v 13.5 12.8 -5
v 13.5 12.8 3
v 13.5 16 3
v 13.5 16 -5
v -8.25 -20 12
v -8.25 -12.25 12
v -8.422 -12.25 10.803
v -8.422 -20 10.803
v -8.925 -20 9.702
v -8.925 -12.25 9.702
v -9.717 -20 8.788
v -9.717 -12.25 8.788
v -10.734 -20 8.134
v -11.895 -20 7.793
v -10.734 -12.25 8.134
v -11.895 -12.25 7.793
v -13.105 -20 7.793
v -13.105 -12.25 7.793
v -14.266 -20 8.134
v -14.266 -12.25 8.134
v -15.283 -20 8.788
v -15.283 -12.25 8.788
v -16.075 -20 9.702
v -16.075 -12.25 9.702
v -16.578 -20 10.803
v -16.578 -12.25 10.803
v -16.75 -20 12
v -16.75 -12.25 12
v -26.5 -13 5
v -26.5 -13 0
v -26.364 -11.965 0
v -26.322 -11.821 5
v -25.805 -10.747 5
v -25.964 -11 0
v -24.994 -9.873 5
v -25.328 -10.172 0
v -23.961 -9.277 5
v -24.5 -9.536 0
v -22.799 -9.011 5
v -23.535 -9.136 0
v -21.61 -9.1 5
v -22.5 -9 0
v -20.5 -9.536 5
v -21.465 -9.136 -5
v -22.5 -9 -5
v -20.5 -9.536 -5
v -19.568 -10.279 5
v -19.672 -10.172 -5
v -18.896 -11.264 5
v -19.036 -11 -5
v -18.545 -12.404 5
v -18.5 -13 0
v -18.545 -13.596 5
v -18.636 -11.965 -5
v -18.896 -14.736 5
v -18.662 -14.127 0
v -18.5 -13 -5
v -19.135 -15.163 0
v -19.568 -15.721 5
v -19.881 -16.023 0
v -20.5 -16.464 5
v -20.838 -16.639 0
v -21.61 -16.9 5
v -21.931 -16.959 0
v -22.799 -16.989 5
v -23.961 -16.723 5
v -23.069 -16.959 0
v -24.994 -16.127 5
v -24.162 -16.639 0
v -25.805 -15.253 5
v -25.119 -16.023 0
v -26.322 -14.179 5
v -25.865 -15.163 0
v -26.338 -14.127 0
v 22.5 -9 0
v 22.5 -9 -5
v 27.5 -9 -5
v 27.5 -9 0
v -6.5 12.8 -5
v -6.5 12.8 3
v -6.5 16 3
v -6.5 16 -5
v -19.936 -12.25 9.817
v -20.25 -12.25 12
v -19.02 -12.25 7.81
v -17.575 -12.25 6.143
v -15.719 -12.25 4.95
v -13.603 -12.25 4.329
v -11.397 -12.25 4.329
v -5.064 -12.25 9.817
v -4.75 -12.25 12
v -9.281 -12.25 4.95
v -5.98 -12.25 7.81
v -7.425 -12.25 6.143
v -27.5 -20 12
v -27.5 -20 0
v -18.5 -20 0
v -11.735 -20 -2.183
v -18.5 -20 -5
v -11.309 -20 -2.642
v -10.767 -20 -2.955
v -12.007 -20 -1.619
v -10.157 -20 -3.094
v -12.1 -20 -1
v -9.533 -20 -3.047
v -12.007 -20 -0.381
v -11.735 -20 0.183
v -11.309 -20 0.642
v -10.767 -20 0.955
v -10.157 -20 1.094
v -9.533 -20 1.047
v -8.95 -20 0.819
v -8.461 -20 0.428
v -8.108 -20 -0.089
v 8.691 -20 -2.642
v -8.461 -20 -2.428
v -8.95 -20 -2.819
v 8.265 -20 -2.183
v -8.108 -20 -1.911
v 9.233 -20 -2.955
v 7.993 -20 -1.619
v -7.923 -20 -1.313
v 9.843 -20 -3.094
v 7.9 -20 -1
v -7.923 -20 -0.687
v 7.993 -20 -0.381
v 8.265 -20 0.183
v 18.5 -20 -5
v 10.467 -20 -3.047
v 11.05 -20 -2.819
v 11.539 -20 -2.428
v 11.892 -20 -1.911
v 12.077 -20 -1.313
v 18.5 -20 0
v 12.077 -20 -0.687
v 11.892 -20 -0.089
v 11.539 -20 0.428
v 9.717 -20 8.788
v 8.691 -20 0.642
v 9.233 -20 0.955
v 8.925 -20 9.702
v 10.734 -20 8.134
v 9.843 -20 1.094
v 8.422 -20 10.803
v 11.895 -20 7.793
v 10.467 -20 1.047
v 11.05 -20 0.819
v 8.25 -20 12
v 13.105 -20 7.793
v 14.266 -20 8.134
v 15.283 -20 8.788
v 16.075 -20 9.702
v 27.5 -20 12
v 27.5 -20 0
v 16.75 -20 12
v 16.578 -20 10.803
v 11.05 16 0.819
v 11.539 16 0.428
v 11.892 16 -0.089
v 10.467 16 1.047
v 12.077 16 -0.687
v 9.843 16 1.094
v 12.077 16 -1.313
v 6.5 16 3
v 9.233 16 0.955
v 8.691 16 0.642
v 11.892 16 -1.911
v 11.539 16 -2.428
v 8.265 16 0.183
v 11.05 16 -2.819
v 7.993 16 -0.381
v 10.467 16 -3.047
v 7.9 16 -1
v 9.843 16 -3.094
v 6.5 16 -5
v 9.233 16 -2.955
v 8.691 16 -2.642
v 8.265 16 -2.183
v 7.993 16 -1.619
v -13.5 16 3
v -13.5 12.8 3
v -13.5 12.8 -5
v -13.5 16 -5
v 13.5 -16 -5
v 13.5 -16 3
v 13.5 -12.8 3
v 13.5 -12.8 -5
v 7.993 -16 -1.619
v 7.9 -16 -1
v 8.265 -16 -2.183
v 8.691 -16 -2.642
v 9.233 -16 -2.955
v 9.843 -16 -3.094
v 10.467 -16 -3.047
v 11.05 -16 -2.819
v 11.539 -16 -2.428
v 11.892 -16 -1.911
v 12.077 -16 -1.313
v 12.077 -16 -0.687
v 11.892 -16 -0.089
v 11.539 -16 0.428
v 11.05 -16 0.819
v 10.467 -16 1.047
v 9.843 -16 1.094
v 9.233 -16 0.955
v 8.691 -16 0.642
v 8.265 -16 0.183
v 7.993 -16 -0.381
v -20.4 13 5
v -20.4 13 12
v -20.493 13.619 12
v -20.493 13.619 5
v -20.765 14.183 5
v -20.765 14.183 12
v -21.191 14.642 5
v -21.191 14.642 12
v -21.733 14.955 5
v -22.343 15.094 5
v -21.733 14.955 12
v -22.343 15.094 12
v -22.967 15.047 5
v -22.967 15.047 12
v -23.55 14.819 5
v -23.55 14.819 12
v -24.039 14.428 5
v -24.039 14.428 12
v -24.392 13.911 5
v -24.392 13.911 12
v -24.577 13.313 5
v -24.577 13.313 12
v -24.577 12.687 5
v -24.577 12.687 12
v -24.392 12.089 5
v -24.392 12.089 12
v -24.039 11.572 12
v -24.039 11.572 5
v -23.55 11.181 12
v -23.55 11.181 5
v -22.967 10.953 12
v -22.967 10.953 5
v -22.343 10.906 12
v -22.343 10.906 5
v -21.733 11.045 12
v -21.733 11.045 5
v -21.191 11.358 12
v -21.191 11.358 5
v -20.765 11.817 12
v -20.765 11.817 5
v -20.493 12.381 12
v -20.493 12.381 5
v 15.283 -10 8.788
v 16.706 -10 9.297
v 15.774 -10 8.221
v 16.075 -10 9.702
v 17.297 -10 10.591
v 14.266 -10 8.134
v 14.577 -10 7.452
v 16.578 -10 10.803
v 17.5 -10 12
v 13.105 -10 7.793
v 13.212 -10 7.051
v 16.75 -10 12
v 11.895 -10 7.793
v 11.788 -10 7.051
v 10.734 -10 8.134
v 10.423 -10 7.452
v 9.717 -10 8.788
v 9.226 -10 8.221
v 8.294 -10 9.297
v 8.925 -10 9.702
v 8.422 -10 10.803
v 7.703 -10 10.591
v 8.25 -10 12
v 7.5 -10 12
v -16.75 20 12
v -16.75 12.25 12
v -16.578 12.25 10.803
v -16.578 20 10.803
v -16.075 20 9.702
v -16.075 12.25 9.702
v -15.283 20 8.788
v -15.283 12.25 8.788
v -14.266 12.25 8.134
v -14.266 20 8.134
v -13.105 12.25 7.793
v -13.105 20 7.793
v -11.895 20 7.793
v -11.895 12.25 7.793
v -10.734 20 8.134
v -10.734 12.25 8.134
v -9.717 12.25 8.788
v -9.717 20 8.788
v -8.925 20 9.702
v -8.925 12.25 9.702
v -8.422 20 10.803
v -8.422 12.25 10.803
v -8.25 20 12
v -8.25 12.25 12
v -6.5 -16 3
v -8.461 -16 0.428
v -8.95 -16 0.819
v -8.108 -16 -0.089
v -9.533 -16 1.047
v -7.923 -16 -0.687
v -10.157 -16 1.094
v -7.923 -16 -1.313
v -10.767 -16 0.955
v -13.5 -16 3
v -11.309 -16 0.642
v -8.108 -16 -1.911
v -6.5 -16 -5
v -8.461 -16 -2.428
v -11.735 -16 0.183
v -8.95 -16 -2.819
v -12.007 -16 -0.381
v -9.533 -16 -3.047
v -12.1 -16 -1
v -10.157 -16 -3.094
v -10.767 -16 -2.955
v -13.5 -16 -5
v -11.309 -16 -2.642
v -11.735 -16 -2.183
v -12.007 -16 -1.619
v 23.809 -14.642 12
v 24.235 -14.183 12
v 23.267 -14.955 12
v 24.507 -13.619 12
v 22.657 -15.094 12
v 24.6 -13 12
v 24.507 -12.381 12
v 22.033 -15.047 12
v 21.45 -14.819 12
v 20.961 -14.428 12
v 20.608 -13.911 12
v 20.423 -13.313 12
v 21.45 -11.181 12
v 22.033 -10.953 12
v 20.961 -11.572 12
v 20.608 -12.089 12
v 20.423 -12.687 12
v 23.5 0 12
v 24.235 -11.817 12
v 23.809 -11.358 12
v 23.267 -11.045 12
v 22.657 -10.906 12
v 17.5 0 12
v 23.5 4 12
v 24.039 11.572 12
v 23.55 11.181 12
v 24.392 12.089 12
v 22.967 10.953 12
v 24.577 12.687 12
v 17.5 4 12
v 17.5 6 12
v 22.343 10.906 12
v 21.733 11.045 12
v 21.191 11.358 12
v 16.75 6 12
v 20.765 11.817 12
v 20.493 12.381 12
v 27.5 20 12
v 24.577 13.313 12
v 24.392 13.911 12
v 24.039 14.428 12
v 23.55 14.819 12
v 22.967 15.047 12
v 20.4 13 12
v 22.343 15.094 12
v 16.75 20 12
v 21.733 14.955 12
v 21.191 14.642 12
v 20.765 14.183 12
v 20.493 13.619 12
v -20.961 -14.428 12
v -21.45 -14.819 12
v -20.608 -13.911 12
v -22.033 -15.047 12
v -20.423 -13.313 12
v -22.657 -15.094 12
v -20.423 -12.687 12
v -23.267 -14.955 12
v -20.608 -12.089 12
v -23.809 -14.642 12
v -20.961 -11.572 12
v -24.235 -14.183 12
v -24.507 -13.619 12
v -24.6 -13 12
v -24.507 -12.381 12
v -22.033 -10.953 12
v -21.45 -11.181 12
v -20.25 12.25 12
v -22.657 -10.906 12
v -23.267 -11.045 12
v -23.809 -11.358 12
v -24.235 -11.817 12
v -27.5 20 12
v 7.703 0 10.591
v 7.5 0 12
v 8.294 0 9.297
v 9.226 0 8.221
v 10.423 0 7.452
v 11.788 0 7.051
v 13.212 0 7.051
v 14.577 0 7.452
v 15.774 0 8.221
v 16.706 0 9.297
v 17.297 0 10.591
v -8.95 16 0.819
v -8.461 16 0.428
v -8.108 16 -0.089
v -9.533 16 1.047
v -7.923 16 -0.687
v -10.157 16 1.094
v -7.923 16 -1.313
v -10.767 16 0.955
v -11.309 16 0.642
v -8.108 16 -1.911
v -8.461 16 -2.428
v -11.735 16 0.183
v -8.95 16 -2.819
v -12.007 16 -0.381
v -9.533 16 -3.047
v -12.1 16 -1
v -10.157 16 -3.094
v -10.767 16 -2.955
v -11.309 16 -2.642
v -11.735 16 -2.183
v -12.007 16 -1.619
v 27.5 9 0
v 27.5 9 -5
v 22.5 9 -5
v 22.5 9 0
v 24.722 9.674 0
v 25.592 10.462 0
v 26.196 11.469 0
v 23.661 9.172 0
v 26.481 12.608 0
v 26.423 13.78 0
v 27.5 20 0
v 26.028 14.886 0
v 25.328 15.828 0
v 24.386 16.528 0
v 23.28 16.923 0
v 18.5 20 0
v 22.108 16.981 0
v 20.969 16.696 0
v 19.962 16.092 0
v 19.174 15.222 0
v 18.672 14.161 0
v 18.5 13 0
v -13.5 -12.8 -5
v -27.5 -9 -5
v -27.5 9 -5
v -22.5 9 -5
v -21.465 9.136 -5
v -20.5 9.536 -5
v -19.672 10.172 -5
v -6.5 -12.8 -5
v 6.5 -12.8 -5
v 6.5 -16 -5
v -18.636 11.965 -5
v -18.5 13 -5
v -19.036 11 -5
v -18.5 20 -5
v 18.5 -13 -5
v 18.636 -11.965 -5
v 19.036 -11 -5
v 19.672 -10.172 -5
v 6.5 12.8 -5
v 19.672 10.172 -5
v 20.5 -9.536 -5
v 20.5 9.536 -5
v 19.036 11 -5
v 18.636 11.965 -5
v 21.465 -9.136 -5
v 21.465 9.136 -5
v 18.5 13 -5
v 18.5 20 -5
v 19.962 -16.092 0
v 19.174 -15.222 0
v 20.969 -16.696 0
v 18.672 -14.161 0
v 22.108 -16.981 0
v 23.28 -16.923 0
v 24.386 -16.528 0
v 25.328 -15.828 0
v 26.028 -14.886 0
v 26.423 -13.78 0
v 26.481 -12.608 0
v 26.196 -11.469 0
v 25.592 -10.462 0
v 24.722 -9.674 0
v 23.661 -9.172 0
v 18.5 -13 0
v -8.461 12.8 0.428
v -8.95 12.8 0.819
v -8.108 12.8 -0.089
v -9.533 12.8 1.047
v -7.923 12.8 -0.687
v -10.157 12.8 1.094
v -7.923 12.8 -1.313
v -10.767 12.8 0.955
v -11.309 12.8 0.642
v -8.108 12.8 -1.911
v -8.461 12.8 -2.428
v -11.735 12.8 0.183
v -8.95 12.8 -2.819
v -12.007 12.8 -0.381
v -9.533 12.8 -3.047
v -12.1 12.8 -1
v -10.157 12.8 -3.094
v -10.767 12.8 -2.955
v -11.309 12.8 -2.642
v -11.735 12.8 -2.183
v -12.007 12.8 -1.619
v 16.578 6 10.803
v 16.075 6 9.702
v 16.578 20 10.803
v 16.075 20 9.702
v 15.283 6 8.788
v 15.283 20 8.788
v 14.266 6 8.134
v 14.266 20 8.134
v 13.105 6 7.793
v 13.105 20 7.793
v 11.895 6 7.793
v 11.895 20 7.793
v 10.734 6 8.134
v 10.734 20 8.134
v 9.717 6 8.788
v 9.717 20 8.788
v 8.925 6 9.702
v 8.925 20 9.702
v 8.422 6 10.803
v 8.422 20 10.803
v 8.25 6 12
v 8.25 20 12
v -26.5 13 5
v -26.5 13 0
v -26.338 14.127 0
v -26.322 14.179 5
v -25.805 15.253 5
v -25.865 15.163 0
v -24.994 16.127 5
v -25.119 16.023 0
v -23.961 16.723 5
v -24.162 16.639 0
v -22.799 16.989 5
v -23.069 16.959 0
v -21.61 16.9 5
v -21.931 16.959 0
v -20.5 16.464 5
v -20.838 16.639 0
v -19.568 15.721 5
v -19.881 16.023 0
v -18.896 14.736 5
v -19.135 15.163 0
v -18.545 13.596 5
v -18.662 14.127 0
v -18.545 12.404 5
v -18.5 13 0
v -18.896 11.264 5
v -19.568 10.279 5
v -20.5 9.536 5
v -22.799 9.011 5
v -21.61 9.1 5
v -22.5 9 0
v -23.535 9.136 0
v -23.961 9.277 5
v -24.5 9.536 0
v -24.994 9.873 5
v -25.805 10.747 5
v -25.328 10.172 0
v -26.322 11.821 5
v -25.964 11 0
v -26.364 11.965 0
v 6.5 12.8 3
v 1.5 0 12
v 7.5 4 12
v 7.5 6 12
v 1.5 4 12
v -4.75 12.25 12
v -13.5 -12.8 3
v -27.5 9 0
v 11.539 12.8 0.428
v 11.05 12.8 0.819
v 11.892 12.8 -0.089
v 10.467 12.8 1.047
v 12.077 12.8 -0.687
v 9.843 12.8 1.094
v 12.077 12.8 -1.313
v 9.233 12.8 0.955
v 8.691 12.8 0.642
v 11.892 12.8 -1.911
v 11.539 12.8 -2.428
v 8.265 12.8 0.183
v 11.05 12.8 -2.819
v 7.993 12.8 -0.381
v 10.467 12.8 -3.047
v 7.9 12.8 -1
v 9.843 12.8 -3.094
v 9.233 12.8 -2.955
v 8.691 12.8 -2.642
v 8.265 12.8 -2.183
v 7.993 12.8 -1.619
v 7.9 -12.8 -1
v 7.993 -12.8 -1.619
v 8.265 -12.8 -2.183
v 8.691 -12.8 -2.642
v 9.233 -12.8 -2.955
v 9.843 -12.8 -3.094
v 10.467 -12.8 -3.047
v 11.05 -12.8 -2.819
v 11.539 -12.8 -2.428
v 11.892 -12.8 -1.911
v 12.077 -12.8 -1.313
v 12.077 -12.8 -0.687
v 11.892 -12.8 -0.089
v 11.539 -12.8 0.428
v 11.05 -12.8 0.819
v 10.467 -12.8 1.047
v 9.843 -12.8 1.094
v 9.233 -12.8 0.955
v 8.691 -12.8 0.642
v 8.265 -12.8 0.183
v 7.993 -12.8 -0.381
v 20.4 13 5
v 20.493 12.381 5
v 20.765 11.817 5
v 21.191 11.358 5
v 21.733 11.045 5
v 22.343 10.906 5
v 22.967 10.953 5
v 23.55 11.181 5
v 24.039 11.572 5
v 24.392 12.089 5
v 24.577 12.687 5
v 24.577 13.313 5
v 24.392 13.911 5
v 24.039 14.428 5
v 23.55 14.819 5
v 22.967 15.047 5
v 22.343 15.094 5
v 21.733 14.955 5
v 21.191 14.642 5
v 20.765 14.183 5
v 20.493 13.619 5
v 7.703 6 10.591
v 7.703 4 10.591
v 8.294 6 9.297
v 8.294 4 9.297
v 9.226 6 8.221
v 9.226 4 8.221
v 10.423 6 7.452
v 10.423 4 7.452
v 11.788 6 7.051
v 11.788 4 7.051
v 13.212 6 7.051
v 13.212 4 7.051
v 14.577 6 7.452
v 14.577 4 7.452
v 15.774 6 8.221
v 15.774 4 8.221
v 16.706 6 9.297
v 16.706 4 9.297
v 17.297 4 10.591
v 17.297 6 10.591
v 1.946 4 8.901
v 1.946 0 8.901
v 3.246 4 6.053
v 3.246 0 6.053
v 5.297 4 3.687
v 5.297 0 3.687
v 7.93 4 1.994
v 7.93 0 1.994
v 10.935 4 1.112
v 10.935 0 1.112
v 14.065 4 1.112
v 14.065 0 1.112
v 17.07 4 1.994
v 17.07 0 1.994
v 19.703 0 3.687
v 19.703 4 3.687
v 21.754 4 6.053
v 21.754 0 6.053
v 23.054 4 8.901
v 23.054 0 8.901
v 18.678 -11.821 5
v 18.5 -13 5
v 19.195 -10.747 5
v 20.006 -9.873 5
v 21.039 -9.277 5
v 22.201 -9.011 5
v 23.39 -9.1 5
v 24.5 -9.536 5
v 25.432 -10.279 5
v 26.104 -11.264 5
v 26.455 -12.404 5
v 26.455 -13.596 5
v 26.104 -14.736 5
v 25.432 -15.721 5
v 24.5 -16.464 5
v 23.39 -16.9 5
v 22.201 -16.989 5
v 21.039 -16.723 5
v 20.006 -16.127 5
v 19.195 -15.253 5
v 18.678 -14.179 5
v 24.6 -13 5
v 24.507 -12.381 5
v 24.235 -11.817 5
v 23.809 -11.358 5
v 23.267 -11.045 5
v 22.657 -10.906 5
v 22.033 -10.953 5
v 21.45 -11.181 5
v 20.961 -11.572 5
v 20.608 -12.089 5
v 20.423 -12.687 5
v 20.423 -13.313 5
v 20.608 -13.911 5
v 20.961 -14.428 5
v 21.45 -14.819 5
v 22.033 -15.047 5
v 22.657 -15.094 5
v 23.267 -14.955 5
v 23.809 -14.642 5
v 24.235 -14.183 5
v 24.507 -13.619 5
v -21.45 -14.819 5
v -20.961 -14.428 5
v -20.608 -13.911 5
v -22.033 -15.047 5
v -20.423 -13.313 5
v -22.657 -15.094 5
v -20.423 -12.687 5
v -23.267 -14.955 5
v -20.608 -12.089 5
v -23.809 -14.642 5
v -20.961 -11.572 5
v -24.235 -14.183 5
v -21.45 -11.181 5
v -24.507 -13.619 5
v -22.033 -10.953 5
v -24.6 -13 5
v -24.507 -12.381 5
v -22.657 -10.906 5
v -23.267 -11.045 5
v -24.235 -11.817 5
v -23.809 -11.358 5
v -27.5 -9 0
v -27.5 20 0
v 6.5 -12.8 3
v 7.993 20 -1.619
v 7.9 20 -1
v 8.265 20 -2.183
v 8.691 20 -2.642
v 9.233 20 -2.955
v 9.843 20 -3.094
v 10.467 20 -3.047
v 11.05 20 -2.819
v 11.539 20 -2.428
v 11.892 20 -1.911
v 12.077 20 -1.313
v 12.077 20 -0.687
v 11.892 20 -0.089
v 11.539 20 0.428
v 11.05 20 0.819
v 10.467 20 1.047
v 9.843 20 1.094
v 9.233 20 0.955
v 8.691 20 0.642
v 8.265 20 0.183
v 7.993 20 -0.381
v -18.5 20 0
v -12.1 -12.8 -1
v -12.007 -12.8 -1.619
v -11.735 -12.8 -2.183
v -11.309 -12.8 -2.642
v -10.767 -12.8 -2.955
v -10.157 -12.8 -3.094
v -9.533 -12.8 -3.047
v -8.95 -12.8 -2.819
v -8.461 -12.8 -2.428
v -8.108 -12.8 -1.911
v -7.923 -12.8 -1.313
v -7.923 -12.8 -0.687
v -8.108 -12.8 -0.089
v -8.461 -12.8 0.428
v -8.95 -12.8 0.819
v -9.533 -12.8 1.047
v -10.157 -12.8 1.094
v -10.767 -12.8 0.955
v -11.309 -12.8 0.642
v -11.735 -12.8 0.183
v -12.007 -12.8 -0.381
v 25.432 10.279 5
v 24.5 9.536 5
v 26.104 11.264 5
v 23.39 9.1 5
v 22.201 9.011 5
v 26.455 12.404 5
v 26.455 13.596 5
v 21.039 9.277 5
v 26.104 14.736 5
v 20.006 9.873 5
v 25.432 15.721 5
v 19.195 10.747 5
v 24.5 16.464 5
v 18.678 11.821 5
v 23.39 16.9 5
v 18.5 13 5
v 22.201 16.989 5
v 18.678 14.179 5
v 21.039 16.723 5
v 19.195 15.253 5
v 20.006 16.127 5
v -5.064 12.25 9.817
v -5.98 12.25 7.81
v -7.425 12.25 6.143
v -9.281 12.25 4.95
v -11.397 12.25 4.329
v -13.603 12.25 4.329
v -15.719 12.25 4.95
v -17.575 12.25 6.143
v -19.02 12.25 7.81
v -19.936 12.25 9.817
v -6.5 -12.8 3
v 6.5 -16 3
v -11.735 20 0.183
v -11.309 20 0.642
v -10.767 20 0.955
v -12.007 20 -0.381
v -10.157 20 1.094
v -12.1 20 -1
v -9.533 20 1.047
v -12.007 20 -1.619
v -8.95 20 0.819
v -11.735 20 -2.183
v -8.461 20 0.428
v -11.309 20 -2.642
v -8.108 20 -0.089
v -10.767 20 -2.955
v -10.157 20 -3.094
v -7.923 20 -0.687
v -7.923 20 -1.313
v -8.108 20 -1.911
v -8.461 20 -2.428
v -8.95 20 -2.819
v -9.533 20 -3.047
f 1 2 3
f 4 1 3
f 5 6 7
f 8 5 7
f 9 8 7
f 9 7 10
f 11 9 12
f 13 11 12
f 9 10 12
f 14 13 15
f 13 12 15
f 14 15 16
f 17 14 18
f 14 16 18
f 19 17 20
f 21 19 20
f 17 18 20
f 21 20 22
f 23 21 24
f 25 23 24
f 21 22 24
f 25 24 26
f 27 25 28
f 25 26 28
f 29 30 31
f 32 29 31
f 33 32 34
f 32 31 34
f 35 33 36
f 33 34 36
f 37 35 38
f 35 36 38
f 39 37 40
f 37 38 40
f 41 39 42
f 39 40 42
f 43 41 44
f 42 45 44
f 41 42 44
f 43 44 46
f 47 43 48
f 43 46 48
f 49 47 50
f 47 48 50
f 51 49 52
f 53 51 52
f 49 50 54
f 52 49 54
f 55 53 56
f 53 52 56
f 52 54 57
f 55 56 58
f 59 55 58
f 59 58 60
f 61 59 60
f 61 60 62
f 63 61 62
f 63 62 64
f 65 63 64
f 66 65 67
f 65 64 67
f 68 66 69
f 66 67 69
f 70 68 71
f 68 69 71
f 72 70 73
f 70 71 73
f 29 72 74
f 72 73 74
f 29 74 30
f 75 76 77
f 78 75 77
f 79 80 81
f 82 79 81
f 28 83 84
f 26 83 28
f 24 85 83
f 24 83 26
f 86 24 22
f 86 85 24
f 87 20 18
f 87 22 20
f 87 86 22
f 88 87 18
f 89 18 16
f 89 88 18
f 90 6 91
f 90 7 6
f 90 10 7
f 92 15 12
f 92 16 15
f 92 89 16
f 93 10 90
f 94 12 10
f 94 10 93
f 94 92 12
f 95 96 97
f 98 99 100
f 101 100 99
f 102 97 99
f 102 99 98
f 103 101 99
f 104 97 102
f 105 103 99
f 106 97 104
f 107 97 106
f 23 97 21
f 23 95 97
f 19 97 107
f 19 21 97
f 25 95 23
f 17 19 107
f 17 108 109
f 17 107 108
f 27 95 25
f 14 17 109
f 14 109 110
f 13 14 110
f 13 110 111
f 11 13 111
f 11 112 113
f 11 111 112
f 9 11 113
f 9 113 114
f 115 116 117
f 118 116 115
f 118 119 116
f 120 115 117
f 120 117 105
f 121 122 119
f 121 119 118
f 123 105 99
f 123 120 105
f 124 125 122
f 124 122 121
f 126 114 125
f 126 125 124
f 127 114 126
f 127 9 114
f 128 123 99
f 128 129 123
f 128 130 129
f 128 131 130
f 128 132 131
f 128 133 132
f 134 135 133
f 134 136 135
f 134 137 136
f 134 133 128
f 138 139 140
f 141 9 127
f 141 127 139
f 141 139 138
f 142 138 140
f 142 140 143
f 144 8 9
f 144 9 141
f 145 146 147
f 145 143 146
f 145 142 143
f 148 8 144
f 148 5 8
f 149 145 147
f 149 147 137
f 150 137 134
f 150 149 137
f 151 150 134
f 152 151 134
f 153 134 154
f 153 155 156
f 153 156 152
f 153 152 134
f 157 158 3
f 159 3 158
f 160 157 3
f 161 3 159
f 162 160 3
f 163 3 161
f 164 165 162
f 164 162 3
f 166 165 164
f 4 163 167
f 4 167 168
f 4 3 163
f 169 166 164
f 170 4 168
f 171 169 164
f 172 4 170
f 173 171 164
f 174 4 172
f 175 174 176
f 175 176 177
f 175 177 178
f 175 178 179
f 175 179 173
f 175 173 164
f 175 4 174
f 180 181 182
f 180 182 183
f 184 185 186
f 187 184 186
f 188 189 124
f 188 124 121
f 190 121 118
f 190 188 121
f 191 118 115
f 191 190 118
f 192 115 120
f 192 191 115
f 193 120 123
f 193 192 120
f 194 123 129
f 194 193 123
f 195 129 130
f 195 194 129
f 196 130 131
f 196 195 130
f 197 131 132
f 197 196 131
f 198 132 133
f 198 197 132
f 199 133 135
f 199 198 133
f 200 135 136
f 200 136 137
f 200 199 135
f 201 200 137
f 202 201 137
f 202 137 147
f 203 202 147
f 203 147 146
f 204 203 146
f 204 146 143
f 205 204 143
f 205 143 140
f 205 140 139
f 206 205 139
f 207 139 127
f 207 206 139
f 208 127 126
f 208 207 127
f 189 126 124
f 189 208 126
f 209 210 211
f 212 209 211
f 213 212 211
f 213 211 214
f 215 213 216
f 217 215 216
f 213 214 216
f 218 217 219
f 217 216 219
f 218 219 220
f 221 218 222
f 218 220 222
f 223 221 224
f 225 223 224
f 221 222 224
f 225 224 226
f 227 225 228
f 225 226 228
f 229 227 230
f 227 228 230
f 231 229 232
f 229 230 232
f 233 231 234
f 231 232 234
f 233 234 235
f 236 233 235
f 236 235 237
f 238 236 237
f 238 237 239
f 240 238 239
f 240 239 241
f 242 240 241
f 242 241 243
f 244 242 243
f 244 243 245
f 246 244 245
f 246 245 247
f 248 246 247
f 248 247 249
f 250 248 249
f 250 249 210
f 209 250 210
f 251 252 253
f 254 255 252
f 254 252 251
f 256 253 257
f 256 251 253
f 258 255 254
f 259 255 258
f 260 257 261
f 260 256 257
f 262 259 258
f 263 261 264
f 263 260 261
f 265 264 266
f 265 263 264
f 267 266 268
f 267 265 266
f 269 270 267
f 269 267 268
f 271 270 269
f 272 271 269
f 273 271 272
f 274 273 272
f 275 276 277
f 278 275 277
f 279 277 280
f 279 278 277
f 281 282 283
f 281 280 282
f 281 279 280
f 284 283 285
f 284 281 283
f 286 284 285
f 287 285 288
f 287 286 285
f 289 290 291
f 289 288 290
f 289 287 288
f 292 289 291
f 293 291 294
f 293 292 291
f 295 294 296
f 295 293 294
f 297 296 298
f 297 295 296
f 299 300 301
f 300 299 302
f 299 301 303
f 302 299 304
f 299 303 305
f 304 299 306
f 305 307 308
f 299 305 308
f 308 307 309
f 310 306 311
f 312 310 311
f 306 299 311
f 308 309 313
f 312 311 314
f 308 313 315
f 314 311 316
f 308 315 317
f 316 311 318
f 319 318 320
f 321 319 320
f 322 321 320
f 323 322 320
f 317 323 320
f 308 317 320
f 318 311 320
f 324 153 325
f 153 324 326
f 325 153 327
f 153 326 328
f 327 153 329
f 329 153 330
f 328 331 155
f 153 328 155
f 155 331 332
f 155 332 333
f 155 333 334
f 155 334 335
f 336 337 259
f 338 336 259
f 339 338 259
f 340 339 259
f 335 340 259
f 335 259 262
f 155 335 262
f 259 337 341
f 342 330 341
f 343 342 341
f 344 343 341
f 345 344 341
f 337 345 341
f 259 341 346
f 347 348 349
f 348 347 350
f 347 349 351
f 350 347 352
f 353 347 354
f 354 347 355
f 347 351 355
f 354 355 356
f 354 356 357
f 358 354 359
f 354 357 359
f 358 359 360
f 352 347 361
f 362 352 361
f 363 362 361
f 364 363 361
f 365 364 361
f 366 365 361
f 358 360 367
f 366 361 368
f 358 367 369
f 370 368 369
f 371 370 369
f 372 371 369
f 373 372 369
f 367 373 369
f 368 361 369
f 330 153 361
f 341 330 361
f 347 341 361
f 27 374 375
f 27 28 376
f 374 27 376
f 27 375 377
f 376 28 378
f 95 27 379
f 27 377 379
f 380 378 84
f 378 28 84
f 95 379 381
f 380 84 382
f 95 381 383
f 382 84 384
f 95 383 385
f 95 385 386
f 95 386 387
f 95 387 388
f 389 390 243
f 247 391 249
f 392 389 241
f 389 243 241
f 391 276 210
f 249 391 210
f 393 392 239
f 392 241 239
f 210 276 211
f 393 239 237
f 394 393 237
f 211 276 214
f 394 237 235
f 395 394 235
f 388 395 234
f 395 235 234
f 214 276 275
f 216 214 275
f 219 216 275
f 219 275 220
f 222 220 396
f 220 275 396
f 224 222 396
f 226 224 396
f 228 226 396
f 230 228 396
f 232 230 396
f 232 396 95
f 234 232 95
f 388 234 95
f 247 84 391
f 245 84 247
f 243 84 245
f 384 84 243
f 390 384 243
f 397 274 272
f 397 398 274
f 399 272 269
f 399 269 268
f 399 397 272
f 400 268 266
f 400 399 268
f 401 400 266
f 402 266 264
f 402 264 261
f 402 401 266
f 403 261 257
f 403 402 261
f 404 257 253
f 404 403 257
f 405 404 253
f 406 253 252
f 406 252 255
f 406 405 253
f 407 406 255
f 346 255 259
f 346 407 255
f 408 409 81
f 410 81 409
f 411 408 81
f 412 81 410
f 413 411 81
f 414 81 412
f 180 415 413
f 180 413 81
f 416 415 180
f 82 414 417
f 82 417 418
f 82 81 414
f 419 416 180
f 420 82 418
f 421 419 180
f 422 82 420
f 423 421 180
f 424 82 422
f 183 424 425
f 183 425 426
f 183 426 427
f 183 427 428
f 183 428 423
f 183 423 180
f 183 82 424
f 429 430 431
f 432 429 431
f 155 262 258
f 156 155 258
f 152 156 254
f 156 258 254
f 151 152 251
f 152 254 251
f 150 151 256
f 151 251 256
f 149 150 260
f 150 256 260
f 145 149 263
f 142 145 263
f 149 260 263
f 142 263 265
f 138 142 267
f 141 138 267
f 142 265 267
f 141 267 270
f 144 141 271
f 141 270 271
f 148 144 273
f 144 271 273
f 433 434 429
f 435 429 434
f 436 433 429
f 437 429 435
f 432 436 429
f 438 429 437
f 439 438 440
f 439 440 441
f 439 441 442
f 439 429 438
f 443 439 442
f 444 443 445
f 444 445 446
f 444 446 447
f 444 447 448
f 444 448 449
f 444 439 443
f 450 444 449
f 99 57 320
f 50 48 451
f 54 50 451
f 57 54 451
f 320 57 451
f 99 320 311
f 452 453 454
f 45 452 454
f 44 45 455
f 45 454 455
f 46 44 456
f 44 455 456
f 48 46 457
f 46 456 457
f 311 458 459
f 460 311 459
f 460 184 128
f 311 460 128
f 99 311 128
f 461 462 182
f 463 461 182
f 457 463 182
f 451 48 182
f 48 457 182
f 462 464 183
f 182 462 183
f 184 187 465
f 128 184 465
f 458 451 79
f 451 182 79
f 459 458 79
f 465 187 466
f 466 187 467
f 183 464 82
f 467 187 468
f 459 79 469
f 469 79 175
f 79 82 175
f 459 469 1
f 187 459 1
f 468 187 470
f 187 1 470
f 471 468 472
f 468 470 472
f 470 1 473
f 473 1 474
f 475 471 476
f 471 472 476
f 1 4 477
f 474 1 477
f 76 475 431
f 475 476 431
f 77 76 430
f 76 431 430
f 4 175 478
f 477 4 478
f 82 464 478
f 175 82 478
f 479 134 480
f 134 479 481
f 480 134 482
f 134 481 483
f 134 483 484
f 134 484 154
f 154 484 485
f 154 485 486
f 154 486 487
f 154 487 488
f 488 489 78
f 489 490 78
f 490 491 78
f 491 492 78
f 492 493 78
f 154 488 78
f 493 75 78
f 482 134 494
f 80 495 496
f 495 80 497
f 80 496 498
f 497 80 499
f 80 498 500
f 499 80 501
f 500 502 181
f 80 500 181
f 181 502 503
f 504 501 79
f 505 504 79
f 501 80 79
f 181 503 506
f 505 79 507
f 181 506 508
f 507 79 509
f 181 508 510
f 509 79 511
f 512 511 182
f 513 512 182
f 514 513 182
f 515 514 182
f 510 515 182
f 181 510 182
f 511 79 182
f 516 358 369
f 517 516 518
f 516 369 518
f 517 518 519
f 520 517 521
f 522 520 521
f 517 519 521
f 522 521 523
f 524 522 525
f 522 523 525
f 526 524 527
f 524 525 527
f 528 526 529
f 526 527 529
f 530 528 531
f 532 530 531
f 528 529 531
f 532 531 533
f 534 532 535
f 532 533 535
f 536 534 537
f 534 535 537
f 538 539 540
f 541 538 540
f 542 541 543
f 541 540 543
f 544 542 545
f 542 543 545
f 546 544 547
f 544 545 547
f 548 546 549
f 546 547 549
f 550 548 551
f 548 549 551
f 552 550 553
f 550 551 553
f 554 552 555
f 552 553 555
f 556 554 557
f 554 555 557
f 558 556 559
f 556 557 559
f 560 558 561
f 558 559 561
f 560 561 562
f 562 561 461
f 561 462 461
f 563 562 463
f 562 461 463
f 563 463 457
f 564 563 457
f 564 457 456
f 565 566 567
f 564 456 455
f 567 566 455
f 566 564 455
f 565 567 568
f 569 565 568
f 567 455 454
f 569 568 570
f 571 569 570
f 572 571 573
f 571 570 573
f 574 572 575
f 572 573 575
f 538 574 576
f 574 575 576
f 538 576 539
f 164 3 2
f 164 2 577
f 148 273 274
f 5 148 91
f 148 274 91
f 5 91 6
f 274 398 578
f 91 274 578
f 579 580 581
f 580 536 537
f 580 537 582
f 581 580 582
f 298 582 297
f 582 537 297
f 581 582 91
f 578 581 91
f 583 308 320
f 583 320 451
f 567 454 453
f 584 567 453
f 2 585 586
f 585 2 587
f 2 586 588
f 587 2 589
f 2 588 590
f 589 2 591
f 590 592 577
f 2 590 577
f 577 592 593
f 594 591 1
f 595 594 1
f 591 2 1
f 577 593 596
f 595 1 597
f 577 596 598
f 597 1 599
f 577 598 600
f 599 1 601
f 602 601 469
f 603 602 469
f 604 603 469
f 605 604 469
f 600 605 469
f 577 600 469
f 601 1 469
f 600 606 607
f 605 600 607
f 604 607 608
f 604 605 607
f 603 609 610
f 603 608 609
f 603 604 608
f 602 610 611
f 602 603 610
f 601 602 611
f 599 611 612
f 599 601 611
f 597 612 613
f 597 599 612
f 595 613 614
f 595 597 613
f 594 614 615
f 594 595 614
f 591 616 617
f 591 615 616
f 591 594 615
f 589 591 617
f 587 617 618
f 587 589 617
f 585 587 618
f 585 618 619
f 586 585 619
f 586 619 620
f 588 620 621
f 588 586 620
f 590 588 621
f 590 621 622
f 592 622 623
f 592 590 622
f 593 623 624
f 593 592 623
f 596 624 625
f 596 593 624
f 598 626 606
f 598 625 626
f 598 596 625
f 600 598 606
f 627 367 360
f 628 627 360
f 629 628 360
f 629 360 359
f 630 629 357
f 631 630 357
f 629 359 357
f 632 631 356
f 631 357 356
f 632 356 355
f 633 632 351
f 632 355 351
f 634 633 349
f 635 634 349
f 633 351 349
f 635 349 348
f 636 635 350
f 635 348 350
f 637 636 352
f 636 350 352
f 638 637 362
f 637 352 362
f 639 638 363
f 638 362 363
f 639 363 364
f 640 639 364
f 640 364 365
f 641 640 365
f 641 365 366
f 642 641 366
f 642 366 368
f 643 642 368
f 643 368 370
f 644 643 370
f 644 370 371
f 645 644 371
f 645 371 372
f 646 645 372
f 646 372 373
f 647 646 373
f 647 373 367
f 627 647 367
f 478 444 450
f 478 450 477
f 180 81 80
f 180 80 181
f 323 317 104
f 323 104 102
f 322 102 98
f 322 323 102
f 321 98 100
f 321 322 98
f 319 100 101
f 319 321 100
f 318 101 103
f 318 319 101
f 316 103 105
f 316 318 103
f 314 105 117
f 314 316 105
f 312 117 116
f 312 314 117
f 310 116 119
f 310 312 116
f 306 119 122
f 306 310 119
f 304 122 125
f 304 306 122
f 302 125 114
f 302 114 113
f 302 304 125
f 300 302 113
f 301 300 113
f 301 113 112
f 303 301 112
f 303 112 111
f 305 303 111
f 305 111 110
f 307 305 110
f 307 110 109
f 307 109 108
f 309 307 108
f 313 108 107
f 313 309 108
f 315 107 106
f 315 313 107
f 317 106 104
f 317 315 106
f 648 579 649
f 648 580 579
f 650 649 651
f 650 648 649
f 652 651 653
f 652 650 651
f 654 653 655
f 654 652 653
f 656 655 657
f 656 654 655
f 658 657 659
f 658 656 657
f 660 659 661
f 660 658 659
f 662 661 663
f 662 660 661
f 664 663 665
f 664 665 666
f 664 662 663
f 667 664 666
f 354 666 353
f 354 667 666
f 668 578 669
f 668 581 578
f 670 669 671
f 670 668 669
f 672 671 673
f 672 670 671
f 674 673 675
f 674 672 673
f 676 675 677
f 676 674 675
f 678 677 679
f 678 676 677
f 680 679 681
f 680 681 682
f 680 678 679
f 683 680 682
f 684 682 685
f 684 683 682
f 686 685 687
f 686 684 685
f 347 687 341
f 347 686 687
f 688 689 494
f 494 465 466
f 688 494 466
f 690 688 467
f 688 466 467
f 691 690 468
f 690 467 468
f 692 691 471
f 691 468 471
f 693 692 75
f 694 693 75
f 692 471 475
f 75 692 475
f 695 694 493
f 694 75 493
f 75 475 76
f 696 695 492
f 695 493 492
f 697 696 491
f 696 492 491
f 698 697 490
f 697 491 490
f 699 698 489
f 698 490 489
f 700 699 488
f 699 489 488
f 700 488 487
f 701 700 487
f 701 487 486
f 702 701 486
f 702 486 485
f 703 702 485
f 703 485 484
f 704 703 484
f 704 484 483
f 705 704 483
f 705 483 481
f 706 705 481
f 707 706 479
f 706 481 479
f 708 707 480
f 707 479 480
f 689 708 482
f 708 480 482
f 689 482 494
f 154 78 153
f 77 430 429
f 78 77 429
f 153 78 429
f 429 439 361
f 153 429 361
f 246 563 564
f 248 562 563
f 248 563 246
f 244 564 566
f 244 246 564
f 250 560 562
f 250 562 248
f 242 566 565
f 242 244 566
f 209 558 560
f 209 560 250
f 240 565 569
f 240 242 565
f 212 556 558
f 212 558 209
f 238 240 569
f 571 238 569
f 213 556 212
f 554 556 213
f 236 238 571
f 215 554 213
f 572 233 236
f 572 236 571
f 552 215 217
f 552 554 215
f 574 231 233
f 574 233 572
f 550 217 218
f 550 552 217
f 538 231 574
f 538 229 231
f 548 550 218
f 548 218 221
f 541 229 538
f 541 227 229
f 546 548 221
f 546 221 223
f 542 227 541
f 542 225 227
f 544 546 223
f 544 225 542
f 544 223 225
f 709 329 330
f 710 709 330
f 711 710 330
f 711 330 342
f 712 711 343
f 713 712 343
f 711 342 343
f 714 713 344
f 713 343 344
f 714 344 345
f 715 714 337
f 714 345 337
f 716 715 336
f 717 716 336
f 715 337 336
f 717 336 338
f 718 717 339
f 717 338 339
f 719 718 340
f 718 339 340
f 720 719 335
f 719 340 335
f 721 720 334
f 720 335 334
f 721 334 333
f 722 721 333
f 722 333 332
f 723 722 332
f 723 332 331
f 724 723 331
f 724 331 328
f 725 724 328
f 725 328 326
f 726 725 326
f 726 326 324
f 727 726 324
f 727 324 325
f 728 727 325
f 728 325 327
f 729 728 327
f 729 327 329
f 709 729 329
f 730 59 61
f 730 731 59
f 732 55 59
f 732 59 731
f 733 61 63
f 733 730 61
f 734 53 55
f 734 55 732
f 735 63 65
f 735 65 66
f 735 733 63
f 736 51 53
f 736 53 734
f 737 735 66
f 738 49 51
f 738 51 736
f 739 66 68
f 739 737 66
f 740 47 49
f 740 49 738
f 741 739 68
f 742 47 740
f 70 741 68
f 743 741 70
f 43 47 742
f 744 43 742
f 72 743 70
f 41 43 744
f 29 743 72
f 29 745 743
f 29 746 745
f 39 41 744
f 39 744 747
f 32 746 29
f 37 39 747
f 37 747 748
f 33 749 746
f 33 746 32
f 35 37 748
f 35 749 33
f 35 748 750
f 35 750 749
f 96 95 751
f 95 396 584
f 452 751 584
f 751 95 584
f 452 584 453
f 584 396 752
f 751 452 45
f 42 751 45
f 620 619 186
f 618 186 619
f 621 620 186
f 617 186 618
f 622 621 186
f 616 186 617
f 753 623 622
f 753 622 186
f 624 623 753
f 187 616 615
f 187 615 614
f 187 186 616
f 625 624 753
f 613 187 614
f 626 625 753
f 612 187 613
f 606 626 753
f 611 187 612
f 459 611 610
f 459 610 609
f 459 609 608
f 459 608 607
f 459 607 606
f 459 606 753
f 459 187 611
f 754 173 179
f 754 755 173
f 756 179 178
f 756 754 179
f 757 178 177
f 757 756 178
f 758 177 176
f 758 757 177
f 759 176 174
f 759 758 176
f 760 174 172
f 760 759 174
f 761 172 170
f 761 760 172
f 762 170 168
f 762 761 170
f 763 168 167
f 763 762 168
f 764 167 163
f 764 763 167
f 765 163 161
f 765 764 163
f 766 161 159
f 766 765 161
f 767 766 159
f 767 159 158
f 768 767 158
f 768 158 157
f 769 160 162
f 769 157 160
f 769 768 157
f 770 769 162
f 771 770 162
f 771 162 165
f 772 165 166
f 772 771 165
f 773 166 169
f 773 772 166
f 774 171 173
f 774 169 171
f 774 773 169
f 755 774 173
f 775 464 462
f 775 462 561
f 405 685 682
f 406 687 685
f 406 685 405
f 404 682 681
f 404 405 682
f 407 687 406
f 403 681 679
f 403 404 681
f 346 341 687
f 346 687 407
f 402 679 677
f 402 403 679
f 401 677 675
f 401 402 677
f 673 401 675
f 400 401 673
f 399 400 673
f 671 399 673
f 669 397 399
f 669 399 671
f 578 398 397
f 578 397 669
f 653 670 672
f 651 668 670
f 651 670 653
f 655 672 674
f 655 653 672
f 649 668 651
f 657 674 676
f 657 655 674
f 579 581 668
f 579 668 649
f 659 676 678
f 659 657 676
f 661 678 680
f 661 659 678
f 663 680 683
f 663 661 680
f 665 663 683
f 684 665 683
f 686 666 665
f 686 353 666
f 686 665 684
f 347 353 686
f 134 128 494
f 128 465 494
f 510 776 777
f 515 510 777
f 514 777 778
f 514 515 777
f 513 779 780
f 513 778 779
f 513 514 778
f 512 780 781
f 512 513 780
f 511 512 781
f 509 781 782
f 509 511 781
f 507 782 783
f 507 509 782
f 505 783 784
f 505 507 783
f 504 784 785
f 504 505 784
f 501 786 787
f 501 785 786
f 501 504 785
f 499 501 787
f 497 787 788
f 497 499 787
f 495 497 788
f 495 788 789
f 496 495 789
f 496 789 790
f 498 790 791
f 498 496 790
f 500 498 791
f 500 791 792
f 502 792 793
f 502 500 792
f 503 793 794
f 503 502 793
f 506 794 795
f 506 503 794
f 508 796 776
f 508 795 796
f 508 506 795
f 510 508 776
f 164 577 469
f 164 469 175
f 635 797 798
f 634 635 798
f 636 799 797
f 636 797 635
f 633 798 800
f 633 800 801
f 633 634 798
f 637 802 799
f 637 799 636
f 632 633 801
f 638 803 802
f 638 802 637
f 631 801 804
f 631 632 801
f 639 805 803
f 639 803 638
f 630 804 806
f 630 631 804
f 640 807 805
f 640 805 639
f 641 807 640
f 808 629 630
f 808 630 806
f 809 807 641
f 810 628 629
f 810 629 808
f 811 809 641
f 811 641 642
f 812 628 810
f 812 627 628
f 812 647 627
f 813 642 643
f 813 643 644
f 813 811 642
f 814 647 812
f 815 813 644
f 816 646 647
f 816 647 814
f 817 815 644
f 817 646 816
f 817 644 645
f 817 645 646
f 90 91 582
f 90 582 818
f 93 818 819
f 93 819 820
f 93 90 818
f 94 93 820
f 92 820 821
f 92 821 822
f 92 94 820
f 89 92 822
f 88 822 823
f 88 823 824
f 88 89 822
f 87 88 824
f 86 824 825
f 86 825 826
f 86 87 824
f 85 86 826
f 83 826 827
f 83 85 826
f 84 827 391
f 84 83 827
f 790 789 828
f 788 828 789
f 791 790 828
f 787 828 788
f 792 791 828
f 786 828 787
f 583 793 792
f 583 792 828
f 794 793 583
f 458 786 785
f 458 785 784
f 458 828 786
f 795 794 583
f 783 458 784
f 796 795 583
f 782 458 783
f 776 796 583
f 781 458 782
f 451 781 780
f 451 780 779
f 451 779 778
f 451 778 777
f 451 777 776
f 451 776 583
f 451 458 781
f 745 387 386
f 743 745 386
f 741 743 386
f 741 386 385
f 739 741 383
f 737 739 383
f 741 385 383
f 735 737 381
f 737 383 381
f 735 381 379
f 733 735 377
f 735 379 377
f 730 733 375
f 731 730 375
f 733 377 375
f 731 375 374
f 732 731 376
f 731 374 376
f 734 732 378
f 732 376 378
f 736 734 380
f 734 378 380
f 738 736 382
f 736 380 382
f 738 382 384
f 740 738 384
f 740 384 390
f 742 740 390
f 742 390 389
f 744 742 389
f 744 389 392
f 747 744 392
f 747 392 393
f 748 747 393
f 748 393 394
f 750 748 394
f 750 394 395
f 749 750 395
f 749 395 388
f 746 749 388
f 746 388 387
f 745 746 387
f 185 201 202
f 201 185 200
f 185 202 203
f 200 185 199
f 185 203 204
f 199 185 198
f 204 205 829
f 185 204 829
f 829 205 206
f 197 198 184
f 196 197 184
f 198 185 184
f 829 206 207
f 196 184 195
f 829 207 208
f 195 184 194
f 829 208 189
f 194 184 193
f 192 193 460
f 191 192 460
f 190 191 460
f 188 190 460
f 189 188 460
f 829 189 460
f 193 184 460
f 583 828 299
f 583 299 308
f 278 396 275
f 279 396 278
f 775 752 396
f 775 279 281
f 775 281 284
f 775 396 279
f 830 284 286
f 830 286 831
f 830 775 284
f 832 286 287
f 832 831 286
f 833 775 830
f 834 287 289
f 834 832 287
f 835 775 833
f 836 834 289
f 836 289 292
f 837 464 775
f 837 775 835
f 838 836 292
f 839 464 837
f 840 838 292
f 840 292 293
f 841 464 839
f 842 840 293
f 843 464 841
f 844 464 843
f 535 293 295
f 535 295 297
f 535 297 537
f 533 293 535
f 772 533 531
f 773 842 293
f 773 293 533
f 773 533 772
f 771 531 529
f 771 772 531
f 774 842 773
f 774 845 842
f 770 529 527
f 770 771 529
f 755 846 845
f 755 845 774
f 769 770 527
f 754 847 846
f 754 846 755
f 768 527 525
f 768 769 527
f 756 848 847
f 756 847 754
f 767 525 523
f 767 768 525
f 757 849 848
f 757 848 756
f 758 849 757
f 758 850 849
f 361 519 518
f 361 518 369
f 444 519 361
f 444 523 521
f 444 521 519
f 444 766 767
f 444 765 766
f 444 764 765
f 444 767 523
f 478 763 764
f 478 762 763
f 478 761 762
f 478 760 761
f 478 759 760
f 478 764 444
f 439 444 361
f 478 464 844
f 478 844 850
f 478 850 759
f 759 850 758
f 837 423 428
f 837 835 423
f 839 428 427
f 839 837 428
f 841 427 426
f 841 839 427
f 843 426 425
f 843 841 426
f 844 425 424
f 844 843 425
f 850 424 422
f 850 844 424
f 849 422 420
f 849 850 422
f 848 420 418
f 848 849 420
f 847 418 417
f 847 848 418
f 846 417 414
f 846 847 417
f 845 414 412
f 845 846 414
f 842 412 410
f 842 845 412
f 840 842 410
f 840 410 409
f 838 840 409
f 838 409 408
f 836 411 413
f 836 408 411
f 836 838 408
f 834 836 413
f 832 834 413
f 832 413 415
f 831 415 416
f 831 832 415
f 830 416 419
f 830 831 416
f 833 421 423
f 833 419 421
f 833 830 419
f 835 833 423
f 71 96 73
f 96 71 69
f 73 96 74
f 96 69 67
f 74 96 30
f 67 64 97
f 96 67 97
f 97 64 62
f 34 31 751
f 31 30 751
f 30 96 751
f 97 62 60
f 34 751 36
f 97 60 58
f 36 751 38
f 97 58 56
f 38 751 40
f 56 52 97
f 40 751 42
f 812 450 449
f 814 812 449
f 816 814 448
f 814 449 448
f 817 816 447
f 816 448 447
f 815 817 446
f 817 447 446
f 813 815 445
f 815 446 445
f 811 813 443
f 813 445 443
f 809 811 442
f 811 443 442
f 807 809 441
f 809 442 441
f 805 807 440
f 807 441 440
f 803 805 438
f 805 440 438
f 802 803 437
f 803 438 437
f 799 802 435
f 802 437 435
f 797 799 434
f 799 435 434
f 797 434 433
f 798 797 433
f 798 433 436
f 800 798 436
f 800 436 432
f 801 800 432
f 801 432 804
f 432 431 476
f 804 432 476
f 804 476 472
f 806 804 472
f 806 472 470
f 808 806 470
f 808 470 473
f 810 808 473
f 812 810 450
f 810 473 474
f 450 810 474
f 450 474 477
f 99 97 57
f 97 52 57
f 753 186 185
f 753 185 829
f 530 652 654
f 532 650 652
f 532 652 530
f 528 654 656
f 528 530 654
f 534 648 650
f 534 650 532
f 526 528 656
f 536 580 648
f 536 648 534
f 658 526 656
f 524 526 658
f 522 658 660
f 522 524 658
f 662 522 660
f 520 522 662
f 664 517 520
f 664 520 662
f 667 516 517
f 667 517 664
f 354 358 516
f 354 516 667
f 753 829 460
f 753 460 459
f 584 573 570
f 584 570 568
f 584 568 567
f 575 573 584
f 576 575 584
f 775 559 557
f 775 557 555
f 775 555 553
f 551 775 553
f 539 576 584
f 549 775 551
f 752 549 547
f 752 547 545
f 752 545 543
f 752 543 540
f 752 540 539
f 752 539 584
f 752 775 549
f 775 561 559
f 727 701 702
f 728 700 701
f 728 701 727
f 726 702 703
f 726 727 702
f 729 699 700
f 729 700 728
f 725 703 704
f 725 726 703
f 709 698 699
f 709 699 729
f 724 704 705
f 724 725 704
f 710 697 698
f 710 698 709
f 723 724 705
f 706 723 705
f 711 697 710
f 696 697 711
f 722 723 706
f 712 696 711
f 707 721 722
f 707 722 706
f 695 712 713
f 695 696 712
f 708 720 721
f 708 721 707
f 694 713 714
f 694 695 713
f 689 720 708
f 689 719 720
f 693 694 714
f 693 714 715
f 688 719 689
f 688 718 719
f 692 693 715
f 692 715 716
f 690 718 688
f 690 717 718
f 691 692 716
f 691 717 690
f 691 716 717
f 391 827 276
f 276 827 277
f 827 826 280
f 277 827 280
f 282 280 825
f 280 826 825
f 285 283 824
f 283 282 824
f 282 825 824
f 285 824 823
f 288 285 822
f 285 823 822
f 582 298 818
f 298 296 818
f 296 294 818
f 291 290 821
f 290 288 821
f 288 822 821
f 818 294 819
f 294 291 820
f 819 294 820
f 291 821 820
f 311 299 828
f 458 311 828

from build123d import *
from build123d.topology import SkipClean

# Parameters (mm, degrees)
ESQUISSE1_W                  = 55
ESQUISSE1_H                  = 45
BOSS_EXTRU_1_DEPTH           = 12
ESQUISSE2_R                  = 4.25
ENL_V_MAT_EXTRU_1_DEPTH      = 55.085580333
ENL_V_MAT_EXTRU_2_DEPTH      = 12.25
ENL_V_MAT_EXTRU_2_DEPTH_BACK = 12.25
ESQUISSE3_R                  = 7.75
ESQUISSE9_W                  = 61.062756781
ESQUISSE9_H                  = 12.22812859
ESQUISSE9_W_2                = 59.427147224
ESQUISSE9_H_2                = 8.100161614
ENL_V_MAT_EXTRU_7_DEPTH      = 31
SKETCH1_W                    = 55
SKETCH1_H                    = 36
BOSS_EXTRUDE1_DEPTH          = 5
SKETCH2_R                    = 2.1
CUT_EXTRUDE1_DEPTH           = 38.003378224
SKETCH3_R                    = 4
CUT_EXTRUDE2_DEPTH           = 10
CUT_EXTRUDE3_DEPTH           = 5
SKETCH5_R                    = 2.1
CUT_EXTRUDE4_DEPTH           = 47.864165415
BOSS_EXTRUDE4_START          = 2
SKETCH7_R                    = 2.1
BOSS_EXTRUDE4_DEPTH          = 2
SKETCH8_R                    = 2.1
BOSS_EXTRUDE5_DEPTH          = 2
SKETCH9_W                    = 7
SKETCH9_H                    = 3.2
CUT_EXTRUDE6_DEPTH           = 8


with BuildPart() as part:
    # Esquisse1 → Boss.-Extru.1 (new body)
    with BuildSketch(Plane.XY):
        Rectangle(ESQUISSE1_W, ESQUISSE1_H)
    extrude(amount=BOSS_EXTRU_1_DEPTH)

    # Esquisse2 → Enlèv. mat.-Extru.1 (cut, through all)
    with BuildSketch(Plane(origin=(0, 22.5, 0), x_dir=(1, 0, 0), z_dir=(0, 1, 0))):
        with Locations((-12.5, -12)):
            Circle(ESQUISSE2_R)
        with Locations((12.5, -12)):
            Circle(ESQUISSE2_R)
    extrude(amount=-ENL_V_MAT_EXTRU_1_DEPTH, mode=Mode.SUBTRACT)

    # Esquisse3 → Enlèv. mat.-Extru.2 (cut, two sides: drawn at the far end of the back side and taken through both)
    with BuildSketch(Plane(origin=(0, 0, 0), x_dir=(1, 0, 0), z_dir=(0, 1, 0)).offset(-ENL_V_MAT_EXTRU_2_DEPTH_BACK)):
        with Locations((-12.5, -12)):
            Circle(ESQUISSE3_R)
    extrude(amount=ENL_V_MAT_EXTRU_2_DEPTH + ENL_V_MAT_EXTRU_2_DEPTH_BACK, mode=Mode.SUBTRACT)

    # Esquisse9 → Enlèv. mat.-Extru.7 (cut)
    with BuildSketch(Plane.XY.offset(12)):
        with Locations((-0.389430846, -24.114064295)):
            Rectangle(ESQUISSE9_W, ESQUISSE9_H)
        with Locations((1.674552641, 22.050080807)):
            Rectangle(ESQUISSE9_W_2, ESQUISSE9_H_2)
    extrude(amount=-ENL_V_MAT_EXTRU_7_DEPTH, mode=Mode.SUBTRACT)

    # Sketch1 → Boss-Extrude1 (add)
    with BuildSketch(Plane(origin=(0, 0, 0), x_dir=(-1, 0, 0), z_dir=(0, 0, -1))):
        Rectangle(SKETCH1_W, SKETCH1_H)
    extrude(amount=BOSS_EXTRUDE1_DEPTH)

    # Sketch2 → Cut-Extrude1 (cut, through all)
    with BuildSketch(Plane.XY.offset(12)):
        with Locations((-22.5, 13)):
            Circle(SKETCH2_R)
        with Locations((22.5, 13)):
            Circle(SKETCH2_R)
        with Locations((22.5, -13)):
            Circle(SKETCH2_R)
        with Locations((-22.5, -13)):
            Circle(SKETCH2_R)
    extrude(amount=-CUT_EXTRUDE1_DEPTH, mode=Mode.SUBTRACT)

    # Sketch3 → Cut-Extrude2 (cut)
    with BuildSketch(Plane(origin=(0, 0, -5), x_dir=(-1, 0, 0), z_dir=(0, 0, -1))):
        with Locations((-22.5, 13)):
            Circle(SKETCH3_R)
        with Locations((22.5, 13)):
            Circle(SKETCH3_R)
        with Locations((22.5, -13)):
            Circle(SKETCH3_R)
        with Locations((-22.5, -13)):
            Circle(SKETCH3_R)
    extrude(amount=-CUT_EXTRUDE2_DEPTH, mode=Mode.SUBTRACT)

    # Sketch4 → Cut-Extrude3 (cut)
    with BuildSketch(Plane(origin=(0, 0, -5), x_dir=(-1, 0, 0), z_dir=(0, 0, -1))):
        with BuildLine():
            Line((-18.5, 13), (-18.5, 18))
            Line((-18.5, 18), (-27.5, 18))
            Line((-27.5, 18), (-27.5, 9))
            Line((-27.5, 9), (-22.5, 9))
            ThreePointArc((-22.5, 9), (-25.328427125, 15.828427125), (-18.5, 13))
        make_face()
        with BuildLine():
            Line((-22.5, -9), (-27.5, -9))
            Line((-27.5, -9), (-27.5, -18))
            Line((-27.5, -18), (-18.5, -18))
            Line((-18.5, -18), (-18.5, -13))
            ThreePointArc((-18.5, -13), (-25.328427125, -15.828427125), (-22.5, -9))
        make_face()
        with BuildLine():
            Line((27.5, -18), (27.5, -9))
            Line((27.5, -9), (22.5, -9))
            ThreePointArc((22.5, -9), (25.328427125, -15.828427125), (18.5, -13))
            Line((18.5, -13), (18.5, -18))
            Line((18.5, -18), (27.5, -18))
        make_face()
        with BuildLine():
            Line((27.5, 18), (18.5, 18))
            Line((18.5, 18), (18.5, 13))
            ThreePointArc((18.5, 13), (25.328427125, 15.828427125), (22.5, 9))
            Line((22.5, 9), (27.5, 9))
            Line((27.5, 9), (27.5, 18))
        make_face()
    extrude(amount=-CUT_EXTRUDE3_DEPTH, mode=Mode.SUBTRACT)

    # Sketch5 → Cut-Extrude4 (cut, through all)
    with BuildSketch(Plane(origin=(0, 18, 0), x_dir=(1, 0, 0), z_dir=(0, 1, 0))):
        with Locations((-10, 1)):
            Circle(SKETCH5_R)
        with Locations((10, 1)):
            Circle(SKETCH5_R)
    extrude(amount=-CUT_EXTRUDE4_DEPTH, mode=Mode.SUBTRACT)

    # Sketch7 → Boss-Extrude4 (add)
    with SkipClean():  # the faces are left unmerged after this step: merging them gives an invalid solid
        with BuildSketch(Plane(origin=(0, 18, 0), x_dir=(1, 0, 0), z_dir=(0, 1, 0)).offset(BOSS_EXTRUDE4_START)):
            with BuildLine():
                Line((18.5, 5), (-18.5, 5))
                Line((-18.5, 5), (-18.5, 0))
                Line((-18.5, 0), (-27.5, 0))
                Line((-27.5, 0), (-27.5, -12))
                Line((-27.5, -12), (-16.75, -12))
                ThreePointArc((-16.75, -12), (-12.5, -7.75), (-8.25, -12))
                Line((-8.25, -12), (8.25, -12))
                ThreePointArc((8.25, -12), (12.5, -7.75), (16.75, -12))
                Line((16.75, -12), (27.5, -12))
                Line((27.5, -12), (27.5, 0))
                Line((27.5, 0), (18.5, 0))
                Line((18.5, 0), (18.5, 5))
            make_face()
            with Locations((10, 1)):
                Circle(SKETCH7_R, mode=Mode.SUBTRACT)
            with Locations((-10, 1)):
                Circle(SKETCH7_R, mode=Mode.SUBTRACT)
        extrude(amount=-BOSS_EXTRUDE4_DEPTH)
    add(part.part.scale(1), mode=Mode.REPLACE)  # the faces are merged on a copy

    # Sketch8 → Boss-Extrude5 (add)
    with BuildSketch(Plane.XZ.offset(18)):
        with BuildLine():
            Line((-27.5, 0), (-18.5, 0))
            Line((-18.5, 0), (-18.5, -5))
            Line((-18.5, -5), (18.5, -5))
            Line((18.5, -5), (18.5, 0))
            Line((18.5, 0), (27.5, 0))
            Line((27.5, 0), (27.5, 12))
            Line((27.5, 12), (16.75, 12))
            ThreePointArc((16.75, 12), (12.5, 7.75), (8.25, 12))
            Line((8.25, 12), (-8.25, 12))
            ThreePointArc((-8.25, 12), (-12.5, 7.75), (-16.75, 12))
            Line((-16.75, 12), (-27.5, 12))
            Line((-27.5, 12), (-27.5, 0))
        make_face()
        with Locations((10, -1)):
            Circle(SKETCH8_R, mode=Mode.SUBTRACT)
        with Locations((-10, -1)):
            Circle(SKETCH8_R, mode=Mode.SUBTRACT)
    extrude(amount=BOSS_EXTRUDE5_DEPTH)

    # Sketch9 → Cut-Extrude6 (cut)
    with BuildSketch(Plane(origin=(0, 0, -5), x_dir=(-1, 0, 0), z_dir=(0, 0, -1))):
        with Locations((-10, 14.4)):
            Rectangle(SKETCH9_W, SKETCH9_H)
        with Locations((10, 14.4)):
            Rectangle(SKETCH9_W, SKETCH9_H)
        with Locations((10, -14.4)):
            Rectangle(SKETCH9_W, SKETCH9_H)
        with Locations((-10, -14.4)):
            Rectangle(SKETCH9_W, SKETCH9_H)
    extrude(amount=-CUT_EXTRUDE6_DEPTH, mode=Mode.SUBTRACT)

    # Sketch10 → Cut-Revolve1 (revolve, cut)
    with BuildSketch(Plane.XY.offset(12)):
        Polygon((12.5, -10), (17.5, -10), (17.5, 0), (23.5, 0), (23.5, 4), (17.5, 4), (17.5, 6), (12.5, 6), align=None)
    revolve(axis=Axis((12.5, 20, 12), (0, -1, 0)), mode=Mode.SUBTRACT)


solid = part.part
